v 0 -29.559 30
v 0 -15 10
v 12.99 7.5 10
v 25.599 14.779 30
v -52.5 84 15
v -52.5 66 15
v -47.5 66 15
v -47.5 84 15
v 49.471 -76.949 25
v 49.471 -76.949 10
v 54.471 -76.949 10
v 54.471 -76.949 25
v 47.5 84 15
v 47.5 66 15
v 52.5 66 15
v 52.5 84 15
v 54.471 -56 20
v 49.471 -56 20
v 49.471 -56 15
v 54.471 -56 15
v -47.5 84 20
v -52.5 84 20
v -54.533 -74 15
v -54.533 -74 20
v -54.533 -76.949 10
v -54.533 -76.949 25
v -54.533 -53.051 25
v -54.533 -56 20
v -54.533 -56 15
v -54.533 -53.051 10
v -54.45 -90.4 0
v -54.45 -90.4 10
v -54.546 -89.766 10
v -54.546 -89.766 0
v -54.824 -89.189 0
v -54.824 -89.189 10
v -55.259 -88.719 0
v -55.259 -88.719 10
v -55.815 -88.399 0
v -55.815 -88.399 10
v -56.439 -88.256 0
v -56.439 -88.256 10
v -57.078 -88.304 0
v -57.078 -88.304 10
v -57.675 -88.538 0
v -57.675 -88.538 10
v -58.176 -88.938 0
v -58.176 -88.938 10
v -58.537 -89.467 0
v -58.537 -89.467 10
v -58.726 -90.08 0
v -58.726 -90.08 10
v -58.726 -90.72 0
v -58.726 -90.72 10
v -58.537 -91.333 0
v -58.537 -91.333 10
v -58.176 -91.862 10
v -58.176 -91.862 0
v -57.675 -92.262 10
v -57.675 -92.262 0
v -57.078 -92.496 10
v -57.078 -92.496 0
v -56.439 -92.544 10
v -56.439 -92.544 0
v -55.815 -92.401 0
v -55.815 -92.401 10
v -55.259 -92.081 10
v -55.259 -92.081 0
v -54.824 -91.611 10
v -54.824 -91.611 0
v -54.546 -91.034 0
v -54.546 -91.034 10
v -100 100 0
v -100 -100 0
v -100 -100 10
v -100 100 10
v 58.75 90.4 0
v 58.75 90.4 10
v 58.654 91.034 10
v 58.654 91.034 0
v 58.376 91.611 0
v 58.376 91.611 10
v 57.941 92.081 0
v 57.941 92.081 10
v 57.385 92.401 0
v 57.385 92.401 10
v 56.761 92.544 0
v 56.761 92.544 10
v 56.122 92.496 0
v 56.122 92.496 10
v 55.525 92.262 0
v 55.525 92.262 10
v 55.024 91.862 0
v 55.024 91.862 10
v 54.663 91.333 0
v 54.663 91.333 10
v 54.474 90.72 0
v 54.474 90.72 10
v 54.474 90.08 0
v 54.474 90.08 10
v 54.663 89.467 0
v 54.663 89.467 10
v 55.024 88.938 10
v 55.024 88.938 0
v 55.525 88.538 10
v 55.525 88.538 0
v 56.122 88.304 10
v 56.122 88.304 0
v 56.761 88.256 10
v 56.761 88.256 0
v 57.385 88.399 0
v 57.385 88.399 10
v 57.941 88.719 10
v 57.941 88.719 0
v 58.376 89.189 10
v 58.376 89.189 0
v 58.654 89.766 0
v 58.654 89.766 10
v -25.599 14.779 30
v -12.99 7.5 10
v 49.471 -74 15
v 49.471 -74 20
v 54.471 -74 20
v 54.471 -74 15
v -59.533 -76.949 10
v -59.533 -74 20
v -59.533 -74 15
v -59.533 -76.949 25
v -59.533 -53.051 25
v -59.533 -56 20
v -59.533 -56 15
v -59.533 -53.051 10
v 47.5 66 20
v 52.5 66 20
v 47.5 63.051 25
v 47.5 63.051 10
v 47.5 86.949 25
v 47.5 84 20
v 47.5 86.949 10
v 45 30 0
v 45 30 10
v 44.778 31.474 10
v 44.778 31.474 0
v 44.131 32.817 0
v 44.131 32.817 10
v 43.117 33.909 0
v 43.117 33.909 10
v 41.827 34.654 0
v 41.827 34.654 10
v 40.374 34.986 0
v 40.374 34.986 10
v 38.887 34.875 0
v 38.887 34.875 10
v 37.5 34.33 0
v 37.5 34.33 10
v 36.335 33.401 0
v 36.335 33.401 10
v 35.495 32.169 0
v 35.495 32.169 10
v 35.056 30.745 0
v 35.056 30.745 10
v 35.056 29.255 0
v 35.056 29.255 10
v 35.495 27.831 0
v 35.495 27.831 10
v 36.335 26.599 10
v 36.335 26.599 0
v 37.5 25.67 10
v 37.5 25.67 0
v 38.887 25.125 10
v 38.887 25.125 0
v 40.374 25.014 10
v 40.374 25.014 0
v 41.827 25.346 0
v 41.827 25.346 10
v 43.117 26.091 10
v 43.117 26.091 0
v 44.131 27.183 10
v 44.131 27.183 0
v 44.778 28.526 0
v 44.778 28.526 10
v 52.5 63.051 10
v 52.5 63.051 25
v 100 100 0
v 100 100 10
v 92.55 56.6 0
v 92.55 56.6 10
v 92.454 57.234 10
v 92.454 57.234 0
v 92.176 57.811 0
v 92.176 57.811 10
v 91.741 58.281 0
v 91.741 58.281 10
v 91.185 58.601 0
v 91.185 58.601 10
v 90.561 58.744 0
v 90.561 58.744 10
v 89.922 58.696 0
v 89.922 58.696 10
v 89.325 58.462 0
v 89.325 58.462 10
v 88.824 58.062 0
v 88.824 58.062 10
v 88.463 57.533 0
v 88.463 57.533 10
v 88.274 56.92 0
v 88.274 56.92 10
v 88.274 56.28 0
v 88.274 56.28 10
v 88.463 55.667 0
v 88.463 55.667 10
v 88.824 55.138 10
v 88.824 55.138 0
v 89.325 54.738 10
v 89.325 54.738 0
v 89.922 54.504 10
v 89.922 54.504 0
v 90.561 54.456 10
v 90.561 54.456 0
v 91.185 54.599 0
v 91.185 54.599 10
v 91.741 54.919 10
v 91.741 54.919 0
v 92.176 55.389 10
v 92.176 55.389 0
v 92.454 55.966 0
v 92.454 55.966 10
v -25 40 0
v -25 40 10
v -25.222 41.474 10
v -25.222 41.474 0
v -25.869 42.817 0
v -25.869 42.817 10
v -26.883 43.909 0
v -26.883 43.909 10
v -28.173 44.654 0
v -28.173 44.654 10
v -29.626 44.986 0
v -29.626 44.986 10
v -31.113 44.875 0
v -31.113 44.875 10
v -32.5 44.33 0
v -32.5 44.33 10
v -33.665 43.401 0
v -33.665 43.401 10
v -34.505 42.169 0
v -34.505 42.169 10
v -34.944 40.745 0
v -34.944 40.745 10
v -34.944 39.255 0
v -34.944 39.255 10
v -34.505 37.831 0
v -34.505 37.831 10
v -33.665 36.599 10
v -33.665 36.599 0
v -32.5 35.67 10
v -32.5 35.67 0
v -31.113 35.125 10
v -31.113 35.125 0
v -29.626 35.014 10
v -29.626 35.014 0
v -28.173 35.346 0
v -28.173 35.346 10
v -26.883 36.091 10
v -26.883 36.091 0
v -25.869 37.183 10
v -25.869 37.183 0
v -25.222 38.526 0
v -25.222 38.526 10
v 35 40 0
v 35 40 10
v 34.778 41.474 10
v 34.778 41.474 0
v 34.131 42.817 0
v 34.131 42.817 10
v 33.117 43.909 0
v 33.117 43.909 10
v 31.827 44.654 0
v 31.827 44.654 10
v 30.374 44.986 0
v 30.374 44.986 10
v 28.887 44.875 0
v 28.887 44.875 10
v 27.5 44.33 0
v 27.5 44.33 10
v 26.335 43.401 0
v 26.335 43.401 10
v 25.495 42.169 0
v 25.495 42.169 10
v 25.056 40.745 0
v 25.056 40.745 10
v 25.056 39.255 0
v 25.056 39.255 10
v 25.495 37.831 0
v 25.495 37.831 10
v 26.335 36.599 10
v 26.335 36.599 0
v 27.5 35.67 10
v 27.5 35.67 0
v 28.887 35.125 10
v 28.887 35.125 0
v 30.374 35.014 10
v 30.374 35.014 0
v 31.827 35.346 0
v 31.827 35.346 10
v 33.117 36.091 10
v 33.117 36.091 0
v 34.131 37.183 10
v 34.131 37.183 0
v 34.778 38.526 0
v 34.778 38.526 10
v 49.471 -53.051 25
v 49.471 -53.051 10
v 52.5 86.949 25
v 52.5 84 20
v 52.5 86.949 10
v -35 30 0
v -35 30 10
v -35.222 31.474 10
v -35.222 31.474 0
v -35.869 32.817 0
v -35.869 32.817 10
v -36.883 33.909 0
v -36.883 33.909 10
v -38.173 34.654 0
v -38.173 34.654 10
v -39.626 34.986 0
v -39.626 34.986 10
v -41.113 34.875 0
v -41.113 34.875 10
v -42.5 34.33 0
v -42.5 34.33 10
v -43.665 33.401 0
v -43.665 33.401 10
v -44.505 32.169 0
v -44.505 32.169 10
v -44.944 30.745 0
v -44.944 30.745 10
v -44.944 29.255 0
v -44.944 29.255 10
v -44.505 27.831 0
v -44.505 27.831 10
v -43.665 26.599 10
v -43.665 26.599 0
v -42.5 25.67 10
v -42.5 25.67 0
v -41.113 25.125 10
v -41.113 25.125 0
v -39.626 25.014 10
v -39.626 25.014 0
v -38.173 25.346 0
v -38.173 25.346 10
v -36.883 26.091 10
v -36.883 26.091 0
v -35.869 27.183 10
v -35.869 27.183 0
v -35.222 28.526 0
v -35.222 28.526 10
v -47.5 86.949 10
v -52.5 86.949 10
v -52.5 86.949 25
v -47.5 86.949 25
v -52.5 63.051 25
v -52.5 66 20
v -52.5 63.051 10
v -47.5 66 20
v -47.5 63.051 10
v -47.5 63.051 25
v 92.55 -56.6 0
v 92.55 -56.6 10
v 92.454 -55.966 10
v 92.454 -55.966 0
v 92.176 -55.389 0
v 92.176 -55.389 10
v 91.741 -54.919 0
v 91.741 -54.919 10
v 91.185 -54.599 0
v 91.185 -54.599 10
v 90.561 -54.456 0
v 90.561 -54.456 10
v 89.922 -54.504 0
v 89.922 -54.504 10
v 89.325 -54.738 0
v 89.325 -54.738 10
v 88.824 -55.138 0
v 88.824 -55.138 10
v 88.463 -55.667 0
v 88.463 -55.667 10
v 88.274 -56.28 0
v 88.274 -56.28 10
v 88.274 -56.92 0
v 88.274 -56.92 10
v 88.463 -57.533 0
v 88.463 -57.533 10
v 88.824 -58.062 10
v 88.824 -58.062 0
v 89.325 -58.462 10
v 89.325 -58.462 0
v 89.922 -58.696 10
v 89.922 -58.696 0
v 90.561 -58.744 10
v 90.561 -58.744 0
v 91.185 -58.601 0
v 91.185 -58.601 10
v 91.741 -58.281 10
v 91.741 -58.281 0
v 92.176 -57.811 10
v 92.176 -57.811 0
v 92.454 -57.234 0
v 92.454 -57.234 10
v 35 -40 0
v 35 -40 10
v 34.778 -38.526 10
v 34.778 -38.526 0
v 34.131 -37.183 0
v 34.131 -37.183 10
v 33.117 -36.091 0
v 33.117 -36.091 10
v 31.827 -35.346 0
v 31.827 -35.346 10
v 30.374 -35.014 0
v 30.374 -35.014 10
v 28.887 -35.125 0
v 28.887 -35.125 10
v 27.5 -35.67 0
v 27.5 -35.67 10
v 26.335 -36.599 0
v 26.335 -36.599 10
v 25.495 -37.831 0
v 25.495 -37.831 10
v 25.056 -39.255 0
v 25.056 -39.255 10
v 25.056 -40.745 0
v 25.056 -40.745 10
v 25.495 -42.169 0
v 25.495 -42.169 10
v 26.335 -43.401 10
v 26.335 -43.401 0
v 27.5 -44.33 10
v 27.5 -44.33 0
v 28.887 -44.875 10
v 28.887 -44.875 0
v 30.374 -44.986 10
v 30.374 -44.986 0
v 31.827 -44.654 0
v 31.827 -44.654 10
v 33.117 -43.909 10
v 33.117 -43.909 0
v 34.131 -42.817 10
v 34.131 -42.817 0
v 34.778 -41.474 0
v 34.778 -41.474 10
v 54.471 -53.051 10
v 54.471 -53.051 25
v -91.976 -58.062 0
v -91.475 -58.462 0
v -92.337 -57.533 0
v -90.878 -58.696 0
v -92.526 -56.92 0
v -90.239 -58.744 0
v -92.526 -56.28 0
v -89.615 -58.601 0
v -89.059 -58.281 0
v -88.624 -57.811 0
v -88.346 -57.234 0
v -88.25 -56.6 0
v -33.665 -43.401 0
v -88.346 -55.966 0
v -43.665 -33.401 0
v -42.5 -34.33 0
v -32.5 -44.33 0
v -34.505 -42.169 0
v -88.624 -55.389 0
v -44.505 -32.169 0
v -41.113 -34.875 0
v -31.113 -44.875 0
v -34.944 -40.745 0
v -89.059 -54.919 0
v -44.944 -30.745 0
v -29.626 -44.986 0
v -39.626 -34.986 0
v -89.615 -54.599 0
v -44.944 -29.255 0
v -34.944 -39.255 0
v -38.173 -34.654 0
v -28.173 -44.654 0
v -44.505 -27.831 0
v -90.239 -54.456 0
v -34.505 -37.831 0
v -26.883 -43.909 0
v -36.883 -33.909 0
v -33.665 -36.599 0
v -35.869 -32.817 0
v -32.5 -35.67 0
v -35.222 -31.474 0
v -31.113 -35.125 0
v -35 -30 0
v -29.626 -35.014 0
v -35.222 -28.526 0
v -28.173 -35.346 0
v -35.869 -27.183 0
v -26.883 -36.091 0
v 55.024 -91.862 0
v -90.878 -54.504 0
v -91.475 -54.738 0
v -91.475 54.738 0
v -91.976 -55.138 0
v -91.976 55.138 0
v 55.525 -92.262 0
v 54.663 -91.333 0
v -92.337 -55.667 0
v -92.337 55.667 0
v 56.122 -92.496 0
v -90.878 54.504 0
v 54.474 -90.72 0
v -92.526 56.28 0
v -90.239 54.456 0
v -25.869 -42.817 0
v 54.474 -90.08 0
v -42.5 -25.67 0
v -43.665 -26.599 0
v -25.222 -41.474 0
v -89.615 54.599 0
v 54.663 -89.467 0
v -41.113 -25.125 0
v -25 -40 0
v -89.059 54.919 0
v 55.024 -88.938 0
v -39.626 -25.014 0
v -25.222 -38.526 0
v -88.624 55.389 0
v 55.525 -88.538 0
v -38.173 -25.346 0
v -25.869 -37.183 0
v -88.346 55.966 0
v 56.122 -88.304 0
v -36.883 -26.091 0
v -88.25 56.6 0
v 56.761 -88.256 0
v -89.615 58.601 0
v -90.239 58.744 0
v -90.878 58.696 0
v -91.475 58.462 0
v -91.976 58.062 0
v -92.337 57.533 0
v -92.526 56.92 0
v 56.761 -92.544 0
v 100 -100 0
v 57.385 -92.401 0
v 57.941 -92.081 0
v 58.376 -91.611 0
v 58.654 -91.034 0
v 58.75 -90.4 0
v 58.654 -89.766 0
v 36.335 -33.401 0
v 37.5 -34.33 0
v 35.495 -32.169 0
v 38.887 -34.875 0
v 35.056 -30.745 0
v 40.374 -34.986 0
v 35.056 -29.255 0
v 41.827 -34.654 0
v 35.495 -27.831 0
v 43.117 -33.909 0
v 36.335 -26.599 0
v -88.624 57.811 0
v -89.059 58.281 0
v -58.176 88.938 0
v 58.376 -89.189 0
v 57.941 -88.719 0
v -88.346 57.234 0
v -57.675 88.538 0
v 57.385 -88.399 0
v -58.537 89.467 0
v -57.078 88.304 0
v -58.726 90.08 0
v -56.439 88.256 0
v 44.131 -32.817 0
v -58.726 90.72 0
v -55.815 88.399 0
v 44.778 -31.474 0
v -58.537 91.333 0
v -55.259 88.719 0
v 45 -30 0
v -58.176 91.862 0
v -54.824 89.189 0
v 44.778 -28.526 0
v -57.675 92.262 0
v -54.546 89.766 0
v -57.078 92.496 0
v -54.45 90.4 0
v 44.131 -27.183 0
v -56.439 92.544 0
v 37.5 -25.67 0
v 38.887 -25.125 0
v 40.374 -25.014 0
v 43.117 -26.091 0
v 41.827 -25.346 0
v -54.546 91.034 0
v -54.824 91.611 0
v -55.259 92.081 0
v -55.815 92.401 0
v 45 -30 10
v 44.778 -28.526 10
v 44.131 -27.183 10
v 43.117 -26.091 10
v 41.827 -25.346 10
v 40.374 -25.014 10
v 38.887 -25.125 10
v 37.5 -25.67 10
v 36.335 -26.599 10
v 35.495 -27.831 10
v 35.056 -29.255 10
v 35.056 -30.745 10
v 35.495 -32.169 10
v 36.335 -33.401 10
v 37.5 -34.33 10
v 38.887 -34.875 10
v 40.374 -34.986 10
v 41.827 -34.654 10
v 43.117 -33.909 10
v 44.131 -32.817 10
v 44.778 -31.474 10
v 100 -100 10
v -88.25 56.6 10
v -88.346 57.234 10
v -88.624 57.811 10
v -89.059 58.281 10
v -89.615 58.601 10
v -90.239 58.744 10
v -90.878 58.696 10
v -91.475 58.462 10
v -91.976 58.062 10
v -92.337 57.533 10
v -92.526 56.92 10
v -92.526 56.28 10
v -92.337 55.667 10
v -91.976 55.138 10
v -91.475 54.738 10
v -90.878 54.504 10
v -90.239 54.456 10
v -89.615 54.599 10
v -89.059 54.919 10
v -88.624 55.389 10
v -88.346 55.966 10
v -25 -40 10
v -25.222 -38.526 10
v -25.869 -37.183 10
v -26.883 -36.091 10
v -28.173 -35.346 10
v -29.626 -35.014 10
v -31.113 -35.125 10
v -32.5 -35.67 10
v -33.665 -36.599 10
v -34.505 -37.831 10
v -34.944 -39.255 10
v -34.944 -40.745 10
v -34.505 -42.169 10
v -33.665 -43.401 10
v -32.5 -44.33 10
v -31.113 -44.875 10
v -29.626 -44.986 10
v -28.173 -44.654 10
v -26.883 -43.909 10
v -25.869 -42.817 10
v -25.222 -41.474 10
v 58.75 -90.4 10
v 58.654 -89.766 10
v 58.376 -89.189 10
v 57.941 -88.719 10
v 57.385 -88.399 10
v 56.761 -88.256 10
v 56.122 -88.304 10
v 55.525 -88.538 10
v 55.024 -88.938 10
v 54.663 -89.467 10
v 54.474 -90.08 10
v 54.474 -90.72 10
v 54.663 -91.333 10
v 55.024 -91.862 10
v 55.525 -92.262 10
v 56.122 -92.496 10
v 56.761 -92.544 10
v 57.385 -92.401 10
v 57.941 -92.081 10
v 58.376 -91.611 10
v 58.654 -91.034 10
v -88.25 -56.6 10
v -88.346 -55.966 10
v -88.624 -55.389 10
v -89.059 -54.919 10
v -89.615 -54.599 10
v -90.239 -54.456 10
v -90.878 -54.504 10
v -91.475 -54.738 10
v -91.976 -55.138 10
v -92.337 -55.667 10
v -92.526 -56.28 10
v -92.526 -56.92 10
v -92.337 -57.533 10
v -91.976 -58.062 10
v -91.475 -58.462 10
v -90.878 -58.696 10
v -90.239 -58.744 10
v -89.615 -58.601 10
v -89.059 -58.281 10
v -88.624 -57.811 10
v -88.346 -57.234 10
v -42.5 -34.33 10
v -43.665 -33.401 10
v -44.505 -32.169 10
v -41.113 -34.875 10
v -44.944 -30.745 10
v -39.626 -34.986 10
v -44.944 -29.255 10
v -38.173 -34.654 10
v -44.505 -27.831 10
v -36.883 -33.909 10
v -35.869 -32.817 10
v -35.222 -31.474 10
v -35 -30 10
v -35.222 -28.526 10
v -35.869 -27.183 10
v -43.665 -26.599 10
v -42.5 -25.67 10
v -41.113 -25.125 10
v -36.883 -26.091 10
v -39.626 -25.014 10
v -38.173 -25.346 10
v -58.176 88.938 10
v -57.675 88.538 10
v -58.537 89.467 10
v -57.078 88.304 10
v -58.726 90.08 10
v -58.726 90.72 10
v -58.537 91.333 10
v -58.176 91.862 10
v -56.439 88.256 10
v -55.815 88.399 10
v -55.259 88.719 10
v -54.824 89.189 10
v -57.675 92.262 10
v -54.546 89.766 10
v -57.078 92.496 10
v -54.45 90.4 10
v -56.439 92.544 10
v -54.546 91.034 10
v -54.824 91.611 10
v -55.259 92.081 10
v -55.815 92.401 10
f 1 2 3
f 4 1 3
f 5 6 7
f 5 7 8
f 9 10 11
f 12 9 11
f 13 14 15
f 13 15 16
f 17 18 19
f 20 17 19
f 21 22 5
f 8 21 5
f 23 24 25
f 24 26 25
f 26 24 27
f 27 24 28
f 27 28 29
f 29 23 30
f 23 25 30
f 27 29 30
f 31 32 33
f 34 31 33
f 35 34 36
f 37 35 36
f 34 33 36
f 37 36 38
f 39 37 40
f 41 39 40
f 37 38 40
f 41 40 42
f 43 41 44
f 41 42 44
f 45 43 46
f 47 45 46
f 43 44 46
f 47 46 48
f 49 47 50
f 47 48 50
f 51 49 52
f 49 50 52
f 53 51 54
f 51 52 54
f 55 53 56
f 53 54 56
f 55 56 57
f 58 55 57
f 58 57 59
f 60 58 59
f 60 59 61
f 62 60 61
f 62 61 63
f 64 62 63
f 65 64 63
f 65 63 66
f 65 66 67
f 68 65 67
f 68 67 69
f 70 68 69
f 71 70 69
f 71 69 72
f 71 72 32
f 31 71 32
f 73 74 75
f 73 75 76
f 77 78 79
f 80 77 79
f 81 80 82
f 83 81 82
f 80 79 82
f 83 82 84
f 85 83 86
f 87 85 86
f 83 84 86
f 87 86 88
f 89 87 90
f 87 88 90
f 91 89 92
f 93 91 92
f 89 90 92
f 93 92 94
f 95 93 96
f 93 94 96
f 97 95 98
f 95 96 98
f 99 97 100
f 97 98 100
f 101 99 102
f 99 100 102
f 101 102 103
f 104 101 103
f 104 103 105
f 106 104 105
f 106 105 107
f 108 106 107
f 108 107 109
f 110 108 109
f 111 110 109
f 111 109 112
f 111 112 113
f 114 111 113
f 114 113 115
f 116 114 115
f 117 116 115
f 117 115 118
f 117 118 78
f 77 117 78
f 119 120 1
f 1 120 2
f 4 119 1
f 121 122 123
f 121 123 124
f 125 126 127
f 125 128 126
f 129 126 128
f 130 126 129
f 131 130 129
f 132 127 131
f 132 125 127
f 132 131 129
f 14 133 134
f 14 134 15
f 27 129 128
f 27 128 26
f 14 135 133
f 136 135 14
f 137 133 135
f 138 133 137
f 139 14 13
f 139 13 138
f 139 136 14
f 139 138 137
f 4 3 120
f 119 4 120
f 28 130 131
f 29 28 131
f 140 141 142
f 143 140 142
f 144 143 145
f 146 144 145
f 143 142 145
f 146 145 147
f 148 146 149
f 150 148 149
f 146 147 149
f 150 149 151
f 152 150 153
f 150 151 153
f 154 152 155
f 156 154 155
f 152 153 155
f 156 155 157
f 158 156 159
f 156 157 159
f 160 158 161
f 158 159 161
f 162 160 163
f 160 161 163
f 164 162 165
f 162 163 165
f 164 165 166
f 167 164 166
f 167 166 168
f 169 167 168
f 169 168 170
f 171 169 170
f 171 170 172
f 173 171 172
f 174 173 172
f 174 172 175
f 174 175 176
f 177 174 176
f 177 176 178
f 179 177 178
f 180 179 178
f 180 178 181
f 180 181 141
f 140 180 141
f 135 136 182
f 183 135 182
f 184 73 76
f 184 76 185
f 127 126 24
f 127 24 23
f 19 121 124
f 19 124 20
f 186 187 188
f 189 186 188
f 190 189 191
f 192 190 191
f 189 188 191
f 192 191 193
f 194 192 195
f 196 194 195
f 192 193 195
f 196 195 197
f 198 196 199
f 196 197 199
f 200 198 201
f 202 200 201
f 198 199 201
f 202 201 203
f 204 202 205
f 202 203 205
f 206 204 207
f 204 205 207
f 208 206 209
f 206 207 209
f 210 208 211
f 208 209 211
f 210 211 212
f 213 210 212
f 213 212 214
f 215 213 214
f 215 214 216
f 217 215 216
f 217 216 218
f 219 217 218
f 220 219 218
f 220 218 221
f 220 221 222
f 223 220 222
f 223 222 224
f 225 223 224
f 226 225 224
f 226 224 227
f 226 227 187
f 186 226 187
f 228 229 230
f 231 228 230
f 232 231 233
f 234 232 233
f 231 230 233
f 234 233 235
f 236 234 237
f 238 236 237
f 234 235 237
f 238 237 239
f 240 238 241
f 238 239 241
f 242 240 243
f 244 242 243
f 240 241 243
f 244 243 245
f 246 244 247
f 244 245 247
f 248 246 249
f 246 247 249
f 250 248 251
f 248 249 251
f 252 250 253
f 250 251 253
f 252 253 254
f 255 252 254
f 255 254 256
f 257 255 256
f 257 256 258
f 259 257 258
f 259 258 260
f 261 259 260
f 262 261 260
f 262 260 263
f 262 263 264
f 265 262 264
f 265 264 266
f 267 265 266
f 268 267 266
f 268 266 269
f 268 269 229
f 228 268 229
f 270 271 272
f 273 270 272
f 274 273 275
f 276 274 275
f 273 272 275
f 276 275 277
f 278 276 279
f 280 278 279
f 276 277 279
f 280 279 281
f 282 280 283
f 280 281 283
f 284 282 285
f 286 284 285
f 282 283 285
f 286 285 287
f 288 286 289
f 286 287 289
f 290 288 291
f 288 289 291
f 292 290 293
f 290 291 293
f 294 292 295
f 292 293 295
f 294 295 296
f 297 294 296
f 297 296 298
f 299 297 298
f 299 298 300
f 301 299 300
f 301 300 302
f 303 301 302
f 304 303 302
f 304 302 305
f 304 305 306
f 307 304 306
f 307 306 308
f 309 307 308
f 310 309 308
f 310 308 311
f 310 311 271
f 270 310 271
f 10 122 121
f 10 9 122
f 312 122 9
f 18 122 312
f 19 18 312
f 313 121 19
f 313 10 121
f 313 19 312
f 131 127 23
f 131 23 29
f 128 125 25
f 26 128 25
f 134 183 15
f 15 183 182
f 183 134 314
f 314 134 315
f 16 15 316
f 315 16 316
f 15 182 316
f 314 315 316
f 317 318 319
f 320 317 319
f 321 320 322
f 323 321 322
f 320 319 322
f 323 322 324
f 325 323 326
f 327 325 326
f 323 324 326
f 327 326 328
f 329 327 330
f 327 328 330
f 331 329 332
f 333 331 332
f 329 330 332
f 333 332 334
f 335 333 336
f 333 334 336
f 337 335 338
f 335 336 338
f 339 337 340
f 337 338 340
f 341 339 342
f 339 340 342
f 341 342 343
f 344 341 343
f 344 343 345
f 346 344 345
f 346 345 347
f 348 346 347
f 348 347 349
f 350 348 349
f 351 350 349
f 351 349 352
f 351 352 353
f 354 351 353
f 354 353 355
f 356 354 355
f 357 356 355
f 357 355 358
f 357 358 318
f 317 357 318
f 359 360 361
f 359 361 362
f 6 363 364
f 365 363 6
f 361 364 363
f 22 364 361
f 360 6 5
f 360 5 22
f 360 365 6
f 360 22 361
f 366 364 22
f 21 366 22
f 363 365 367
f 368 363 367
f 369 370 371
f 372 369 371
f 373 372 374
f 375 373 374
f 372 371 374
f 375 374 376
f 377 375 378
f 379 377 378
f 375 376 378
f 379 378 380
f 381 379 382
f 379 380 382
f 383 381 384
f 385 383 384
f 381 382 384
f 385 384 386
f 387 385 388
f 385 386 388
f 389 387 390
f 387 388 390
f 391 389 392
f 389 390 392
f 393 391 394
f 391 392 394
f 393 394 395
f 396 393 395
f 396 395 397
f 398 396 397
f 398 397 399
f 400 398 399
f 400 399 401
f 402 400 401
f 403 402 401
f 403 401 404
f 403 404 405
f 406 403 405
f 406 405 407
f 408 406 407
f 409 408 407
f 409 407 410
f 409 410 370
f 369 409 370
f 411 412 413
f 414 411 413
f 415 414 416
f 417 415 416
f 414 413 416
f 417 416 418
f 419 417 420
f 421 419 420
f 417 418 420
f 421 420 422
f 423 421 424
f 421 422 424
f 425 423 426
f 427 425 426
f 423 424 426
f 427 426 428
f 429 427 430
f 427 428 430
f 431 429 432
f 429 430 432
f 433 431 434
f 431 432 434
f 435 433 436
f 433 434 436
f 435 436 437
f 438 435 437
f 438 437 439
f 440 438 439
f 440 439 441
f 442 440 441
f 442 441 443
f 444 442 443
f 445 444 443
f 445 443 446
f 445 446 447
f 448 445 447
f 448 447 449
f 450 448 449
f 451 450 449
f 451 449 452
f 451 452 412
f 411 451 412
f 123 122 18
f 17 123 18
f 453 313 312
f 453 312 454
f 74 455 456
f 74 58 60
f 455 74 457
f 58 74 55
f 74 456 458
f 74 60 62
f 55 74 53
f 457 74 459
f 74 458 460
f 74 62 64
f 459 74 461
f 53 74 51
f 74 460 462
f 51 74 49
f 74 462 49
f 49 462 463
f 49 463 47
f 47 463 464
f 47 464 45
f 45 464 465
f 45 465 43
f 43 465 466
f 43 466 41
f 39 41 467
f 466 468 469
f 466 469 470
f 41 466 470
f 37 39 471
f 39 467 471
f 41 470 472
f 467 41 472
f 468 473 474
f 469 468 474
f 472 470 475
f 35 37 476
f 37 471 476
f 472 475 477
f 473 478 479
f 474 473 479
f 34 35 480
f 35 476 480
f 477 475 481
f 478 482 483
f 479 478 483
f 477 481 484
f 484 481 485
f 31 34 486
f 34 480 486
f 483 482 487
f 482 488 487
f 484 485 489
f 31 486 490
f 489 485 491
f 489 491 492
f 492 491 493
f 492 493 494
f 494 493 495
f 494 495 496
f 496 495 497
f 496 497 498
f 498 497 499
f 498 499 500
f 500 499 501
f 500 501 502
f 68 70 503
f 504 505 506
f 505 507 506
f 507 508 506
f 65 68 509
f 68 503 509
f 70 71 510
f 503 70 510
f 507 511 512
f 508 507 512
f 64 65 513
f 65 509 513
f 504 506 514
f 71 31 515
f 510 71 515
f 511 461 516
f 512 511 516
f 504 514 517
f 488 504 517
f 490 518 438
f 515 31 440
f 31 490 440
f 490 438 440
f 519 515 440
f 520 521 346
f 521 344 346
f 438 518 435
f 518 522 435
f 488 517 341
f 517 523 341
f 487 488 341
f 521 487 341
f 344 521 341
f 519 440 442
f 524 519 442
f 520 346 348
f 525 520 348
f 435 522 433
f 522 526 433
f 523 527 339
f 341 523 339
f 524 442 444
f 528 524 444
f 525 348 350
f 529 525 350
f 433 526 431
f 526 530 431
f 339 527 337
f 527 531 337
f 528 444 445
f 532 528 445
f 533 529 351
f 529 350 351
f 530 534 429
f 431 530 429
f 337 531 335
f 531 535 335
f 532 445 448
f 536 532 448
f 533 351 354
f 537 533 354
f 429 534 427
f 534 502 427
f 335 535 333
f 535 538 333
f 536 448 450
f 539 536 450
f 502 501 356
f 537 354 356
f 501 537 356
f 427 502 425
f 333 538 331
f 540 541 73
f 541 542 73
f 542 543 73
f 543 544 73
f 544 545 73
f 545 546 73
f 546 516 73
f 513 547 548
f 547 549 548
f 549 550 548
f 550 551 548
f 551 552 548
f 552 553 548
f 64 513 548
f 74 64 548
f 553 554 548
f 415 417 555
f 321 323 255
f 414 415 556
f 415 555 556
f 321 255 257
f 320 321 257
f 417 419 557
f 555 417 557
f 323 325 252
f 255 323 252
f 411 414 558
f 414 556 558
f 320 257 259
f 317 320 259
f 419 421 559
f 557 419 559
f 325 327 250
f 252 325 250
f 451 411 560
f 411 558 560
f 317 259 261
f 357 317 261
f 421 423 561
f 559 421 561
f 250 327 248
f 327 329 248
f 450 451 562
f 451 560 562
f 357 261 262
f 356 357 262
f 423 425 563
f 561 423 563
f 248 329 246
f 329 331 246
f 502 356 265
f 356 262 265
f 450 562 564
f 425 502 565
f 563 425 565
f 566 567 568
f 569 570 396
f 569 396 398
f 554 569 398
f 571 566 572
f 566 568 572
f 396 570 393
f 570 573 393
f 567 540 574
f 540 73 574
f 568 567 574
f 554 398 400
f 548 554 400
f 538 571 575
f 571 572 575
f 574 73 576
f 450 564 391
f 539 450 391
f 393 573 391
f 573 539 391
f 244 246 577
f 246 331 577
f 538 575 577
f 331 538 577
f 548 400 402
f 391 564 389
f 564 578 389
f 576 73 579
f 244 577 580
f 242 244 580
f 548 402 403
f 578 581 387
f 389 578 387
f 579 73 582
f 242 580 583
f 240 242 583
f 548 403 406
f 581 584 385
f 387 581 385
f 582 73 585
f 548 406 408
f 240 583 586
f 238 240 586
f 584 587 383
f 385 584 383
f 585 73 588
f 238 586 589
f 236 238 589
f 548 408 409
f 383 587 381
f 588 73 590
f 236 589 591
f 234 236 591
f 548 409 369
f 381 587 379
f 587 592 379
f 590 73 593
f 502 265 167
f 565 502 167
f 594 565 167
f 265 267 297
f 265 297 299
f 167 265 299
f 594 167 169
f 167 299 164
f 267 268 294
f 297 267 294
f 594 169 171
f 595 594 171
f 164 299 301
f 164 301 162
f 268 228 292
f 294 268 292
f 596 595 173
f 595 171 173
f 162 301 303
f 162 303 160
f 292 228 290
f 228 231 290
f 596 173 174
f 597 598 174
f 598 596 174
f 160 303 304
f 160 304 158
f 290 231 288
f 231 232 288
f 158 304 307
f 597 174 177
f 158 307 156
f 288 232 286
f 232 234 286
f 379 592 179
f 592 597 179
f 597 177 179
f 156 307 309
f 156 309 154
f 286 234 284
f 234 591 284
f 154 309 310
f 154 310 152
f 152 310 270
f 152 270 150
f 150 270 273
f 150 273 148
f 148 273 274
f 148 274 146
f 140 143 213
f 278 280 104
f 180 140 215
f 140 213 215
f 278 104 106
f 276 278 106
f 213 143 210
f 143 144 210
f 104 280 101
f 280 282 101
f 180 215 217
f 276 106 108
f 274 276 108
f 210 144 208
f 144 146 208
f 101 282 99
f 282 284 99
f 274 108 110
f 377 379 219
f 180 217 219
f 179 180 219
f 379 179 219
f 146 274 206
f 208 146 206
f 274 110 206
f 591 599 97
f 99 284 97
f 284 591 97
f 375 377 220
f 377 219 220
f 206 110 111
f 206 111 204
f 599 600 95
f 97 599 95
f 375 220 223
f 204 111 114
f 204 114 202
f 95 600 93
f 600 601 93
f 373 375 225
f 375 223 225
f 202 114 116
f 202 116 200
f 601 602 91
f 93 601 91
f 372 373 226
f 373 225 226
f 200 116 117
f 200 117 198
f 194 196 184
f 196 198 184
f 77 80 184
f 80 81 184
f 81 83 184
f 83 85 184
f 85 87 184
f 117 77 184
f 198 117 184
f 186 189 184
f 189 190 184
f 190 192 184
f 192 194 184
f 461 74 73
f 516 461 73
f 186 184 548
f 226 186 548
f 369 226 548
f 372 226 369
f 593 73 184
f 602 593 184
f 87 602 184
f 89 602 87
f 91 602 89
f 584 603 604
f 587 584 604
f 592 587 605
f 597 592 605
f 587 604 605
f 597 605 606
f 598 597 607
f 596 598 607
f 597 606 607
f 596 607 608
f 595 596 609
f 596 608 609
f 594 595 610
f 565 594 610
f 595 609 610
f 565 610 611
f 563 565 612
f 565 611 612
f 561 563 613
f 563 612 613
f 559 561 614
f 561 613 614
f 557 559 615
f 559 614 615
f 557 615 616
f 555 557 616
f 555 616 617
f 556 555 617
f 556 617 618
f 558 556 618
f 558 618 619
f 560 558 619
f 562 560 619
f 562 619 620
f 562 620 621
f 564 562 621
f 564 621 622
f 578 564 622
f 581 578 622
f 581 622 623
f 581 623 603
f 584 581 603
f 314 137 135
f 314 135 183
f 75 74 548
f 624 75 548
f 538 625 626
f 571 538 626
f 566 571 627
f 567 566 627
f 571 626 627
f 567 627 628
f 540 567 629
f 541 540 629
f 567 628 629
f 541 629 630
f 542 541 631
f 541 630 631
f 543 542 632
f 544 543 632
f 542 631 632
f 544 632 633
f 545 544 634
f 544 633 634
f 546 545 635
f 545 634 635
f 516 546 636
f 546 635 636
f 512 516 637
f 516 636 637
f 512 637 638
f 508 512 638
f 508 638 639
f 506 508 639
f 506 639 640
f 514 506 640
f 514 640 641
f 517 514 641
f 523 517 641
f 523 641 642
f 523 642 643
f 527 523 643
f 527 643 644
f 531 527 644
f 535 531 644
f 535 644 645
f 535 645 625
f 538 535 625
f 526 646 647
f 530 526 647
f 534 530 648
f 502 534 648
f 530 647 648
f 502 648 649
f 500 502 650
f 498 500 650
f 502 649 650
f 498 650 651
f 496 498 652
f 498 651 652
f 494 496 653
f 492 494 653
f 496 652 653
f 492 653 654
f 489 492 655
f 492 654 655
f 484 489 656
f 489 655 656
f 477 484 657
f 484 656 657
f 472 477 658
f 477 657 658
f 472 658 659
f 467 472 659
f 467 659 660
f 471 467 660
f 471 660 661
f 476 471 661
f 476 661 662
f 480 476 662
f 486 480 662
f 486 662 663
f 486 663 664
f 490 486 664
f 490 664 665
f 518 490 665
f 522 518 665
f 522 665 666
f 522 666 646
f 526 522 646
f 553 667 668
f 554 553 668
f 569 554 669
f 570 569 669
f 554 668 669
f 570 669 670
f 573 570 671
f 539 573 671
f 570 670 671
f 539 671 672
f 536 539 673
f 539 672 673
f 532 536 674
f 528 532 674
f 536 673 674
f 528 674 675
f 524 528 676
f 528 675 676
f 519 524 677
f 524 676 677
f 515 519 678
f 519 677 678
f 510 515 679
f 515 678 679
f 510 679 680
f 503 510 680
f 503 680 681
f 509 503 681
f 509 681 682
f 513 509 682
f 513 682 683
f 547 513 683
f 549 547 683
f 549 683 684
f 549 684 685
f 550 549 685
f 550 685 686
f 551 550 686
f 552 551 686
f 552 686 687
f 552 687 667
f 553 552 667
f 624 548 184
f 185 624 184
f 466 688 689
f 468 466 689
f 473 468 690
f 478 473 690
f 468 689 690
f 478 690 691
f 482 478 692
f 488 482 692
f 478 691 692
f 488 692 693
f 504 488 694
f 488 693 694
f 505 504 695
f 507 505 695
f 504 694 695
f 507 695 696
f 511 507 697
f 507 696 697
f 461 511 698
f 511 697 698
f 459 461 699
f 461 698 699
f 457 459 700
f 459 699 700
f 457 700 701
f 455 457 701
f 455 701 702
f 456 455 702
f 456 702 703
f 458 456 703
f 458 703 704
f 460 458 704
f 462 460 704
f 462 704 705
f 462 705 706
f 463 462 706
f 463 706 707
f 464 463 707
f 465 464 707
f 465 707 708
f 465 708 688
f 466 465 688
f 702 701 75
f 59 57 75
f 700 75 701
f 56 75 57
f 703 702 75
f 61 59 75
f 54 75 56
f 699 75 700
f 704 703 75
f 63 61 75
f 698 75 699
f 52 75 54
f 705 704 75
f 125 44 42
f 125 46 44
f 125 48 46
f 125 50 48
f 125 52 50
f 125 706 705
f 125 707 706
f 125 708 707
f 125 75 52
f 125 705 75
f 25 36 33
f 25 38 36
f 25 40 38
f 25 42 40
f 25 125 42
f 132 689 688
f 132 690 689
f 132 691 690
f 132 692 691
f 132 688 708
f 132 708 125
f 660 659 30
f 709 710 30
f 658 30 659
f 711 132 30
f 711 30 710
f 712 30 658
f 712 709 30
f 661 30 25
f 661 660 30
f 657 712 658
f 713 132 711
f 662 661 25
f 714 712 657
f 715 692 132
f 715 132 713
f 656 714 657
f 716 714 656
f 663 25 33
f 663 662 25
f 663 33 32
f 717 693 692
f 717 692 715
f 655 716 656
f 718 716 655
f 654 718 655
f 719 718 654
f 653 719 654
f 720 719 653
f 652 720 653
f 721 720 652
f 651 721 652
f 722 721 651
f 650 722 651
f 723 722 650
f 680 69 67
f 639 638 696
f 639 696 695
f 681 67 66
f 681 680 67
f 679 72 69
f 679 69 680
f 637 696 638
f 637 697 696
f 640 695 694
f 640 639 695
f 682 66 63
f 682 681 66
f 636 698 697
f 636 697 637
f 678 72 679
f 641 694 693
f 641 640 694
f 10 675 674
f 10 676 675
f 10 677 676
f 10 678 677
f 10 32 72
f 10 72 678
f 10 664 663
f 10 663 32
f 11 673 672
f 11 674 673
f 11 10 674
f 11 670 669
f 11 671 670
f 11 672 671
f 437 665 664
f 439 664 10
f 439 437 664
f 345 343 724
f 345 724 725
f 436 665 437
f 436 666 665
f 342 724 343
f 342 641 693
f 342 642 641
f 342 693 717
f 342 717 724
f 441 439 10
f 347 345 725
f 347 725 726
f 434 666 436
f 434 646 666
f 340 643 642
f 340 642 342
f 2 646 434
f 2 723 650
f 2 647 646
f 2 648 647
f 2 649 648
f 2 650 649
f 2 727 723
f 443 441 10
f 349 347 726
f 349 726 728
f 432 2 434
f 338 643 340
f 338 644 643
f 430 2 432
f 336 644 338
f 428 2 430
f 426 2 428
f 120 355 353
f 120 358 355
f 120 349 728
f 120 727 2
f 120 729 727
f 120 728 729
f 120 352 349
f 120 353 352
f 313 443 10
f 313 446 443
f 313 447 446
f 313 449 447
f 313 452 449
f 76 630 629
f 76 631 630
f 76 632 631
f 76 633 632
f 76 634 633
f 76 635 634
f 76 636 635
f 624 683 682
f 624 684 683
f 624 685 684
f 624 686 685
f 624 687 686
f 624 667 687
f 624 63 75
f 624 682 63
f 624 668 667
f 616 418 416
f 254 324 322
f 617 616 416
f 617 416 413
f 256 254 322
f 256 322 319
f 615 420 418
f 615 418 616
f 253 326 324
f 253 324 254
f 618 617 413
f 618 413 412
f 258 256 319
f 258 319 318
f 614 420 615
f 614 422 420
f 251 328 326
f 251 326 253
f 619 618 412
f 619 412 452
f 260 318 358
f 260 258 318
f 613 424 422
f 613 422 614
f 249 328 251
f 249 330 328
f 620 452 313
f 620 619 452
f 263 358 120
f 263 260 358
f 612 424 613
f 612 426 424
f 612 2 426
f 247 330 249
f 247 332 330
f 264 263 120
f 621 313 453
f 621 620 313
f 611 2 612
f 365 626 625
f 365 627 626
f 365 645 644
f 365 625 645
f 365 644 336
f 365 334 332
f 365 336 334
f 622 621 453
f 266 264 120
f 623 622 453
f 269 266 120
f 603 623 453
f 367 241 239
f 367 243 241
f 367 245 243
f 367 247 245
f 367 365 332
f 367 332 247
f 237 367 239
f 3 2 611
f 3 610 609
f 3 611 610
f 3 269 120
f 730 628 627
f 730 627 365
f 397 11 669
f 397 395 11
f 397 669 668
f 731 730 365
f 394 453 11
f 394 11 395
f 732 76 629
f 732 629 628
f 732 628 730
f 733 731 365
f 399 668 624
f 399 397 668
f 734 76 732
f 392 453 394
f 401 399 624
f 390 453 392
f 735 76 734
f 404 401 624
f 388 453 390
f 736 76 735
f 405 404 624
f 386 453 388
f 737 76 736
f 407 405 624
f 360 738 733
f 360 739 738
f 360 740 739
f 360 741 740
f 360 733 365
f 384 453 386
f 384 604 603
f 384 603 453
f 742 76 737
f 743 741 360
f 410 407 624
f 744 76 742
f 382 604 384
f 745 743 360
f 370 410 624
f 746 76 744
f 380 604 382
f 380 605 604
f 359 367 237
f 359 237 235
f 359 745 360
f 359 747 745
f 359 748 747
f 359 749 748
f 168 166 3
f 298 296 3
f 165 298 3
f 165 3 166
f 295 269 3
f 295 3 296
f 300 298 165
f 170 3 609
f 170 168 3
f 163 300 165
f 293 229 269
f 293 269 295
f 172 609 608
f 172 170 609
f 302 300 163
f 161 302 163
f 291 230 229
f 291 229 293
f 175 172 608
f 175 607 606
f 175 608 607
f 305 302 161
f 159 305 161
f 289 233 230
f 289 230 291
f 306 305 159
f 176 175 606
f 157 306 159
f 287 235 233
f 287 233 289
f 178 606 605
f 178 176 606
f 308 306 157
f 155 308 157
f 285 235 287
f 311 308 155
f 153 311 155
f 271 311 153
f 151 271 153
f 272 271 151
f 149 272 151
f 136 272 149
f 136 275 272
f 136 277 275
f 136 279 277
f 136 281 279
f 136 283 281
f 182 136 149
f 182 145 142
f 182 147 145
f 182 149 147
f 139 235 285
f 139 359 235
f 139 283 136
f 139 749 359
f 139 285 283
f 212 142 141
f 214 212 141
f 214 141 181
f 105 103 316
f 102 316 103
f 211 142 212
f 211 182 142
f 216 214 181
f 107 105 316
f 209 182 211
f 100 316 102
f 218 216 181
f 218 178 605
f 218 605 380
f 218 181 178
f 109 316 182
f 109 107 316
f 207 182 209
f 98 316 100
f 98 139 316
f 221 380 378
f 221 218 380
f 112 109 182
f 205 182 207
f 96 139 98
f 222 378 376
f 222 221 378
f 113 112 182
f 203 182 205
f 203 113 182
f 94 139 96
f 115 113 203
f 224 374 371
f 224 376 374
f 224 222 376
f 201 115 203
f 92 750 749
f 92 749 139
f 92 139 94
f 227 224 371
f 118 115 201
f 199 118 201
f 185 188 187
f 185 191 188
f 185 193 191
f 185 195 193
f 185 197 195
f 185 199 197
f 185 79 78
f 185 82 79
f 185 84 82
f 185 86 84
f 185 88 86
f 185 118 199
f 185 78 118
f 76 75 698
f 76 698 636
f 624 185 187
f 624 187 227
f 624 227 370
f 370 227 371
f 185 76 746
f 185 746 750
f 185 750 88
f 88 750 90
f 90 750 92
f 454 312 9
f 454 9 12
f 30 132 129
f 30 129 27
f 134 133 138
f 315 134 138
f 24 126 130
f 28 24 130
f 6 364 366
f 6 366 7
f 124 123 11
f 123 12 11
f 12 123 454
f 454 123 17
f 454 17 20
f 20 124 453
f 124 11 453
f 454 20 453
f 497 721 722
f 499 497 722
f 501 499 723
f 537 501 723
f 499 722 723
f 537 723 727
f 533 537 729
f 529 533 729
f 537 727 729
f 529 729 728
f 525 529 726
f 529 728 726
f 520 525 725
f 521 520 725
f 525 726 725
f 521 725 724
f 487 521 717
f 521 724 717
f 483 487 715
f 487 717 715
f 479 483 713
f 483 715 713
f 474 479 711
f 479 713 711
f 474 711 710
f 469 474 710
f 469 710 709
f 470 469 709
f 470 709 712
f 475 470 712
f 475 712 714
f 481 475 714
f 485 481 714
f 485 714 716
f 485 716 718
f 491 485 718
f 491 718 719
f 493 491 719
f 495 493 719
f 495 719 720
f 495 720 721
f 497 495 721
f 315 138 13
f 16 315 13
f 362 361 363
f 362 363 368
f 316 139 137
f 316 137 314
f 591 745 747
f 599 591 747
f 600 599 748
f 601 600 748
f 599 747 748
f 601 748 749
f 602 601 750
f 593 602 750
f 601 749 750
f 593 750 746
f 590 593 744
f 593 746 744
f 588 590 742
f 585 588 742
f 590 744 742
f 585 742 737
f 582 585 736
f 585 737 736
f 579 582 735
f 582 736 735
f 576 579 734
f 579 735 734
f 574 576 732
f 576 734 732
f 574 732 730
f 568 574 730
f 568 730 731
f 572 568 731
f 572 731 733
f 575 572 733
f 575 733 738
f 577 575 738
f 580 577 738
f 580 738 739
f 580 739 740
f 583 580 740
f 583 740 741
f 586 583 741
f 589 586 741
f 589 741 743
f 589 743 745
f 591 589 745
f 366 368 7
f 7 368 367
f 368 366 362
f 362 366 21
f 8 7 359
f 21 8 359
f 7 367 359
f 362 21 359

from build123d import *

# Parameters (mm, degrees)
SKETCH1_W               = 200
SKETCH1_H               = 200
BOSS_EXTRUDE1_DEPTH     = 10
SKETCH2_R               = 5
SKETCH2_R_2             = 2.15
CUT_EXTRUDE1_DEPTH      = 142.774468788
BOSS_EXTRUDE2_DEPTH     = 20
DRAFT3_ANGLE            = -20
SKETCH6_W               = 5
SKETCH6_H               = 23.898224132
BOSS_EXTRUDE3_DEPTH     = 15
CUT_EXTRUDE3_DEPTH      = 185.814095783
CUT_EXTRUDE3_DEPTH_BACK = 185.814095783
SKETCH7_W               = 5
SKETCH7_H               = 18


with BuildPart() as part:
    # Sketch1 → Boss-Extrude1 (new body)
    with BuildSketch(Plane.XY):
        Rectangle(SKETCH1_W, SKETCH1_H)
    extrude(amount=BOSS_EXTRUDE1_DEPTH)

    # Sketch2 → Cut-Extrude1 (cut, through all)
    with BuildSketch(Plane.XY.offset(10)):
        with Locations((-40, 30)):
            Circle(SKETCH2_R)
        with Locations((40, 30)):
            Circle(SKETCH2_R)
        with Locations((40, -30)):
            Circle(SKETCH2_R)
        with Locations((-40, -30)):
            Circle(SKETCH2_R)
        with Locations((-30, 40)):
            Circle(SKETCH2_R)
        with Locations((30, 40)):
            Circle(SKETCH2_R)
        with Locations((30, -40)):
            Circle(SKETCH2_R)
        with Locations((-30, -40)):
            Circle(SKETCH2_R)
        with Locations((-56.6, 90.4)):
            Circle(SKETCH2_R_2)
        with Locations((-90.4, 56.6)):
            Circle(SKETCH2_R_2)
        with Locations((-90.4, -56.6)):
            Circle(SKETCH2_R_2)
        with Locations((-56.6, -90.4)):
            Circle(SKETCH2_R_2)
        with Locations((56.6, -90.4)):
            Circle(SKETCH2_R_2)
        with Locations((90.4, -56.6)):
            Circle(SKETCH2_R_2)
        with Locations((90.4, 56.6)):
            Circle(SKETCH2_R_2)
        with Locations((56.6, 90.4)):
            Circle(SKETCH2_R_2)
    extrude(amount=-CUT_EXTRUDE1_DEPTH, mode=Mode.SUBTRACT)

    # Sketch4 → Boss-Extrude2 (add)
    with BuildSketch(Plane.XY.offset(10)):
        Polygon((0, -15), (12.990381057, 7.5), (-12.990381057, 7.5), align=None)
    extrude(amount=BOSS_EXTRUDE2_DEPTH)

    # Draft3
    draft3_faces = [part.faces().sort_by_distance(p)[0] for p in [
        (0, 7.5, 20),
        (-6.495190528, -3.75, 20),
        (6.495190528, -3.75, 20),
    ]]
    draft(draft3_faces, Plane.XY.offset(10), DRAFT3_ANGLE)

    # Sketch6 → Boss-Extrude3 (add)
    with BuildSketch(Plane.XY.offset(10)):
        with Locations((50, 75)):
            Rectangle(SKETCH6_W, SKETCH6_H)
        with Locations((-50, 75)):
            Rectangle(SKETCH6_W, SKETCH6_H)
        with Locations((-57.033087887, -65)):
            Rectangle(SKETCH6_W, SKETCH6_H)
        with Locations((51.971023082, -65)):
            Rectangle(SKETCH6_W, SKETCH6_H)
    extrude(amount=BOSS_EXTRUDE3_DEPTH)

    # Sketch7 → Cut-Extrude3 (cut, two sides: drawn at the far end of the back side and taken through both)
    with BuildSketch(Plane(origin=(52.5, 0, 0), x_dir=(0, 0, -1), z_dir=(1, 0, 0)).offset(-CUT_EXTRUDE3_DEPTH_BACK)):
        with Locations((-17.5, 75)):
            Rectangle(SKETCH7_W, SKETCH7_H)
        with Locations((-17.5, -65)):
            Rectangle(SKETCH7_W, SKETCH7_H)
    extrude(amount=CUT_EXTRUDE3_DEPTH + CUT_EXTRUDE3_DEPTH_BACK, mode=Mode.SUBTRACT)


solid = part.part
